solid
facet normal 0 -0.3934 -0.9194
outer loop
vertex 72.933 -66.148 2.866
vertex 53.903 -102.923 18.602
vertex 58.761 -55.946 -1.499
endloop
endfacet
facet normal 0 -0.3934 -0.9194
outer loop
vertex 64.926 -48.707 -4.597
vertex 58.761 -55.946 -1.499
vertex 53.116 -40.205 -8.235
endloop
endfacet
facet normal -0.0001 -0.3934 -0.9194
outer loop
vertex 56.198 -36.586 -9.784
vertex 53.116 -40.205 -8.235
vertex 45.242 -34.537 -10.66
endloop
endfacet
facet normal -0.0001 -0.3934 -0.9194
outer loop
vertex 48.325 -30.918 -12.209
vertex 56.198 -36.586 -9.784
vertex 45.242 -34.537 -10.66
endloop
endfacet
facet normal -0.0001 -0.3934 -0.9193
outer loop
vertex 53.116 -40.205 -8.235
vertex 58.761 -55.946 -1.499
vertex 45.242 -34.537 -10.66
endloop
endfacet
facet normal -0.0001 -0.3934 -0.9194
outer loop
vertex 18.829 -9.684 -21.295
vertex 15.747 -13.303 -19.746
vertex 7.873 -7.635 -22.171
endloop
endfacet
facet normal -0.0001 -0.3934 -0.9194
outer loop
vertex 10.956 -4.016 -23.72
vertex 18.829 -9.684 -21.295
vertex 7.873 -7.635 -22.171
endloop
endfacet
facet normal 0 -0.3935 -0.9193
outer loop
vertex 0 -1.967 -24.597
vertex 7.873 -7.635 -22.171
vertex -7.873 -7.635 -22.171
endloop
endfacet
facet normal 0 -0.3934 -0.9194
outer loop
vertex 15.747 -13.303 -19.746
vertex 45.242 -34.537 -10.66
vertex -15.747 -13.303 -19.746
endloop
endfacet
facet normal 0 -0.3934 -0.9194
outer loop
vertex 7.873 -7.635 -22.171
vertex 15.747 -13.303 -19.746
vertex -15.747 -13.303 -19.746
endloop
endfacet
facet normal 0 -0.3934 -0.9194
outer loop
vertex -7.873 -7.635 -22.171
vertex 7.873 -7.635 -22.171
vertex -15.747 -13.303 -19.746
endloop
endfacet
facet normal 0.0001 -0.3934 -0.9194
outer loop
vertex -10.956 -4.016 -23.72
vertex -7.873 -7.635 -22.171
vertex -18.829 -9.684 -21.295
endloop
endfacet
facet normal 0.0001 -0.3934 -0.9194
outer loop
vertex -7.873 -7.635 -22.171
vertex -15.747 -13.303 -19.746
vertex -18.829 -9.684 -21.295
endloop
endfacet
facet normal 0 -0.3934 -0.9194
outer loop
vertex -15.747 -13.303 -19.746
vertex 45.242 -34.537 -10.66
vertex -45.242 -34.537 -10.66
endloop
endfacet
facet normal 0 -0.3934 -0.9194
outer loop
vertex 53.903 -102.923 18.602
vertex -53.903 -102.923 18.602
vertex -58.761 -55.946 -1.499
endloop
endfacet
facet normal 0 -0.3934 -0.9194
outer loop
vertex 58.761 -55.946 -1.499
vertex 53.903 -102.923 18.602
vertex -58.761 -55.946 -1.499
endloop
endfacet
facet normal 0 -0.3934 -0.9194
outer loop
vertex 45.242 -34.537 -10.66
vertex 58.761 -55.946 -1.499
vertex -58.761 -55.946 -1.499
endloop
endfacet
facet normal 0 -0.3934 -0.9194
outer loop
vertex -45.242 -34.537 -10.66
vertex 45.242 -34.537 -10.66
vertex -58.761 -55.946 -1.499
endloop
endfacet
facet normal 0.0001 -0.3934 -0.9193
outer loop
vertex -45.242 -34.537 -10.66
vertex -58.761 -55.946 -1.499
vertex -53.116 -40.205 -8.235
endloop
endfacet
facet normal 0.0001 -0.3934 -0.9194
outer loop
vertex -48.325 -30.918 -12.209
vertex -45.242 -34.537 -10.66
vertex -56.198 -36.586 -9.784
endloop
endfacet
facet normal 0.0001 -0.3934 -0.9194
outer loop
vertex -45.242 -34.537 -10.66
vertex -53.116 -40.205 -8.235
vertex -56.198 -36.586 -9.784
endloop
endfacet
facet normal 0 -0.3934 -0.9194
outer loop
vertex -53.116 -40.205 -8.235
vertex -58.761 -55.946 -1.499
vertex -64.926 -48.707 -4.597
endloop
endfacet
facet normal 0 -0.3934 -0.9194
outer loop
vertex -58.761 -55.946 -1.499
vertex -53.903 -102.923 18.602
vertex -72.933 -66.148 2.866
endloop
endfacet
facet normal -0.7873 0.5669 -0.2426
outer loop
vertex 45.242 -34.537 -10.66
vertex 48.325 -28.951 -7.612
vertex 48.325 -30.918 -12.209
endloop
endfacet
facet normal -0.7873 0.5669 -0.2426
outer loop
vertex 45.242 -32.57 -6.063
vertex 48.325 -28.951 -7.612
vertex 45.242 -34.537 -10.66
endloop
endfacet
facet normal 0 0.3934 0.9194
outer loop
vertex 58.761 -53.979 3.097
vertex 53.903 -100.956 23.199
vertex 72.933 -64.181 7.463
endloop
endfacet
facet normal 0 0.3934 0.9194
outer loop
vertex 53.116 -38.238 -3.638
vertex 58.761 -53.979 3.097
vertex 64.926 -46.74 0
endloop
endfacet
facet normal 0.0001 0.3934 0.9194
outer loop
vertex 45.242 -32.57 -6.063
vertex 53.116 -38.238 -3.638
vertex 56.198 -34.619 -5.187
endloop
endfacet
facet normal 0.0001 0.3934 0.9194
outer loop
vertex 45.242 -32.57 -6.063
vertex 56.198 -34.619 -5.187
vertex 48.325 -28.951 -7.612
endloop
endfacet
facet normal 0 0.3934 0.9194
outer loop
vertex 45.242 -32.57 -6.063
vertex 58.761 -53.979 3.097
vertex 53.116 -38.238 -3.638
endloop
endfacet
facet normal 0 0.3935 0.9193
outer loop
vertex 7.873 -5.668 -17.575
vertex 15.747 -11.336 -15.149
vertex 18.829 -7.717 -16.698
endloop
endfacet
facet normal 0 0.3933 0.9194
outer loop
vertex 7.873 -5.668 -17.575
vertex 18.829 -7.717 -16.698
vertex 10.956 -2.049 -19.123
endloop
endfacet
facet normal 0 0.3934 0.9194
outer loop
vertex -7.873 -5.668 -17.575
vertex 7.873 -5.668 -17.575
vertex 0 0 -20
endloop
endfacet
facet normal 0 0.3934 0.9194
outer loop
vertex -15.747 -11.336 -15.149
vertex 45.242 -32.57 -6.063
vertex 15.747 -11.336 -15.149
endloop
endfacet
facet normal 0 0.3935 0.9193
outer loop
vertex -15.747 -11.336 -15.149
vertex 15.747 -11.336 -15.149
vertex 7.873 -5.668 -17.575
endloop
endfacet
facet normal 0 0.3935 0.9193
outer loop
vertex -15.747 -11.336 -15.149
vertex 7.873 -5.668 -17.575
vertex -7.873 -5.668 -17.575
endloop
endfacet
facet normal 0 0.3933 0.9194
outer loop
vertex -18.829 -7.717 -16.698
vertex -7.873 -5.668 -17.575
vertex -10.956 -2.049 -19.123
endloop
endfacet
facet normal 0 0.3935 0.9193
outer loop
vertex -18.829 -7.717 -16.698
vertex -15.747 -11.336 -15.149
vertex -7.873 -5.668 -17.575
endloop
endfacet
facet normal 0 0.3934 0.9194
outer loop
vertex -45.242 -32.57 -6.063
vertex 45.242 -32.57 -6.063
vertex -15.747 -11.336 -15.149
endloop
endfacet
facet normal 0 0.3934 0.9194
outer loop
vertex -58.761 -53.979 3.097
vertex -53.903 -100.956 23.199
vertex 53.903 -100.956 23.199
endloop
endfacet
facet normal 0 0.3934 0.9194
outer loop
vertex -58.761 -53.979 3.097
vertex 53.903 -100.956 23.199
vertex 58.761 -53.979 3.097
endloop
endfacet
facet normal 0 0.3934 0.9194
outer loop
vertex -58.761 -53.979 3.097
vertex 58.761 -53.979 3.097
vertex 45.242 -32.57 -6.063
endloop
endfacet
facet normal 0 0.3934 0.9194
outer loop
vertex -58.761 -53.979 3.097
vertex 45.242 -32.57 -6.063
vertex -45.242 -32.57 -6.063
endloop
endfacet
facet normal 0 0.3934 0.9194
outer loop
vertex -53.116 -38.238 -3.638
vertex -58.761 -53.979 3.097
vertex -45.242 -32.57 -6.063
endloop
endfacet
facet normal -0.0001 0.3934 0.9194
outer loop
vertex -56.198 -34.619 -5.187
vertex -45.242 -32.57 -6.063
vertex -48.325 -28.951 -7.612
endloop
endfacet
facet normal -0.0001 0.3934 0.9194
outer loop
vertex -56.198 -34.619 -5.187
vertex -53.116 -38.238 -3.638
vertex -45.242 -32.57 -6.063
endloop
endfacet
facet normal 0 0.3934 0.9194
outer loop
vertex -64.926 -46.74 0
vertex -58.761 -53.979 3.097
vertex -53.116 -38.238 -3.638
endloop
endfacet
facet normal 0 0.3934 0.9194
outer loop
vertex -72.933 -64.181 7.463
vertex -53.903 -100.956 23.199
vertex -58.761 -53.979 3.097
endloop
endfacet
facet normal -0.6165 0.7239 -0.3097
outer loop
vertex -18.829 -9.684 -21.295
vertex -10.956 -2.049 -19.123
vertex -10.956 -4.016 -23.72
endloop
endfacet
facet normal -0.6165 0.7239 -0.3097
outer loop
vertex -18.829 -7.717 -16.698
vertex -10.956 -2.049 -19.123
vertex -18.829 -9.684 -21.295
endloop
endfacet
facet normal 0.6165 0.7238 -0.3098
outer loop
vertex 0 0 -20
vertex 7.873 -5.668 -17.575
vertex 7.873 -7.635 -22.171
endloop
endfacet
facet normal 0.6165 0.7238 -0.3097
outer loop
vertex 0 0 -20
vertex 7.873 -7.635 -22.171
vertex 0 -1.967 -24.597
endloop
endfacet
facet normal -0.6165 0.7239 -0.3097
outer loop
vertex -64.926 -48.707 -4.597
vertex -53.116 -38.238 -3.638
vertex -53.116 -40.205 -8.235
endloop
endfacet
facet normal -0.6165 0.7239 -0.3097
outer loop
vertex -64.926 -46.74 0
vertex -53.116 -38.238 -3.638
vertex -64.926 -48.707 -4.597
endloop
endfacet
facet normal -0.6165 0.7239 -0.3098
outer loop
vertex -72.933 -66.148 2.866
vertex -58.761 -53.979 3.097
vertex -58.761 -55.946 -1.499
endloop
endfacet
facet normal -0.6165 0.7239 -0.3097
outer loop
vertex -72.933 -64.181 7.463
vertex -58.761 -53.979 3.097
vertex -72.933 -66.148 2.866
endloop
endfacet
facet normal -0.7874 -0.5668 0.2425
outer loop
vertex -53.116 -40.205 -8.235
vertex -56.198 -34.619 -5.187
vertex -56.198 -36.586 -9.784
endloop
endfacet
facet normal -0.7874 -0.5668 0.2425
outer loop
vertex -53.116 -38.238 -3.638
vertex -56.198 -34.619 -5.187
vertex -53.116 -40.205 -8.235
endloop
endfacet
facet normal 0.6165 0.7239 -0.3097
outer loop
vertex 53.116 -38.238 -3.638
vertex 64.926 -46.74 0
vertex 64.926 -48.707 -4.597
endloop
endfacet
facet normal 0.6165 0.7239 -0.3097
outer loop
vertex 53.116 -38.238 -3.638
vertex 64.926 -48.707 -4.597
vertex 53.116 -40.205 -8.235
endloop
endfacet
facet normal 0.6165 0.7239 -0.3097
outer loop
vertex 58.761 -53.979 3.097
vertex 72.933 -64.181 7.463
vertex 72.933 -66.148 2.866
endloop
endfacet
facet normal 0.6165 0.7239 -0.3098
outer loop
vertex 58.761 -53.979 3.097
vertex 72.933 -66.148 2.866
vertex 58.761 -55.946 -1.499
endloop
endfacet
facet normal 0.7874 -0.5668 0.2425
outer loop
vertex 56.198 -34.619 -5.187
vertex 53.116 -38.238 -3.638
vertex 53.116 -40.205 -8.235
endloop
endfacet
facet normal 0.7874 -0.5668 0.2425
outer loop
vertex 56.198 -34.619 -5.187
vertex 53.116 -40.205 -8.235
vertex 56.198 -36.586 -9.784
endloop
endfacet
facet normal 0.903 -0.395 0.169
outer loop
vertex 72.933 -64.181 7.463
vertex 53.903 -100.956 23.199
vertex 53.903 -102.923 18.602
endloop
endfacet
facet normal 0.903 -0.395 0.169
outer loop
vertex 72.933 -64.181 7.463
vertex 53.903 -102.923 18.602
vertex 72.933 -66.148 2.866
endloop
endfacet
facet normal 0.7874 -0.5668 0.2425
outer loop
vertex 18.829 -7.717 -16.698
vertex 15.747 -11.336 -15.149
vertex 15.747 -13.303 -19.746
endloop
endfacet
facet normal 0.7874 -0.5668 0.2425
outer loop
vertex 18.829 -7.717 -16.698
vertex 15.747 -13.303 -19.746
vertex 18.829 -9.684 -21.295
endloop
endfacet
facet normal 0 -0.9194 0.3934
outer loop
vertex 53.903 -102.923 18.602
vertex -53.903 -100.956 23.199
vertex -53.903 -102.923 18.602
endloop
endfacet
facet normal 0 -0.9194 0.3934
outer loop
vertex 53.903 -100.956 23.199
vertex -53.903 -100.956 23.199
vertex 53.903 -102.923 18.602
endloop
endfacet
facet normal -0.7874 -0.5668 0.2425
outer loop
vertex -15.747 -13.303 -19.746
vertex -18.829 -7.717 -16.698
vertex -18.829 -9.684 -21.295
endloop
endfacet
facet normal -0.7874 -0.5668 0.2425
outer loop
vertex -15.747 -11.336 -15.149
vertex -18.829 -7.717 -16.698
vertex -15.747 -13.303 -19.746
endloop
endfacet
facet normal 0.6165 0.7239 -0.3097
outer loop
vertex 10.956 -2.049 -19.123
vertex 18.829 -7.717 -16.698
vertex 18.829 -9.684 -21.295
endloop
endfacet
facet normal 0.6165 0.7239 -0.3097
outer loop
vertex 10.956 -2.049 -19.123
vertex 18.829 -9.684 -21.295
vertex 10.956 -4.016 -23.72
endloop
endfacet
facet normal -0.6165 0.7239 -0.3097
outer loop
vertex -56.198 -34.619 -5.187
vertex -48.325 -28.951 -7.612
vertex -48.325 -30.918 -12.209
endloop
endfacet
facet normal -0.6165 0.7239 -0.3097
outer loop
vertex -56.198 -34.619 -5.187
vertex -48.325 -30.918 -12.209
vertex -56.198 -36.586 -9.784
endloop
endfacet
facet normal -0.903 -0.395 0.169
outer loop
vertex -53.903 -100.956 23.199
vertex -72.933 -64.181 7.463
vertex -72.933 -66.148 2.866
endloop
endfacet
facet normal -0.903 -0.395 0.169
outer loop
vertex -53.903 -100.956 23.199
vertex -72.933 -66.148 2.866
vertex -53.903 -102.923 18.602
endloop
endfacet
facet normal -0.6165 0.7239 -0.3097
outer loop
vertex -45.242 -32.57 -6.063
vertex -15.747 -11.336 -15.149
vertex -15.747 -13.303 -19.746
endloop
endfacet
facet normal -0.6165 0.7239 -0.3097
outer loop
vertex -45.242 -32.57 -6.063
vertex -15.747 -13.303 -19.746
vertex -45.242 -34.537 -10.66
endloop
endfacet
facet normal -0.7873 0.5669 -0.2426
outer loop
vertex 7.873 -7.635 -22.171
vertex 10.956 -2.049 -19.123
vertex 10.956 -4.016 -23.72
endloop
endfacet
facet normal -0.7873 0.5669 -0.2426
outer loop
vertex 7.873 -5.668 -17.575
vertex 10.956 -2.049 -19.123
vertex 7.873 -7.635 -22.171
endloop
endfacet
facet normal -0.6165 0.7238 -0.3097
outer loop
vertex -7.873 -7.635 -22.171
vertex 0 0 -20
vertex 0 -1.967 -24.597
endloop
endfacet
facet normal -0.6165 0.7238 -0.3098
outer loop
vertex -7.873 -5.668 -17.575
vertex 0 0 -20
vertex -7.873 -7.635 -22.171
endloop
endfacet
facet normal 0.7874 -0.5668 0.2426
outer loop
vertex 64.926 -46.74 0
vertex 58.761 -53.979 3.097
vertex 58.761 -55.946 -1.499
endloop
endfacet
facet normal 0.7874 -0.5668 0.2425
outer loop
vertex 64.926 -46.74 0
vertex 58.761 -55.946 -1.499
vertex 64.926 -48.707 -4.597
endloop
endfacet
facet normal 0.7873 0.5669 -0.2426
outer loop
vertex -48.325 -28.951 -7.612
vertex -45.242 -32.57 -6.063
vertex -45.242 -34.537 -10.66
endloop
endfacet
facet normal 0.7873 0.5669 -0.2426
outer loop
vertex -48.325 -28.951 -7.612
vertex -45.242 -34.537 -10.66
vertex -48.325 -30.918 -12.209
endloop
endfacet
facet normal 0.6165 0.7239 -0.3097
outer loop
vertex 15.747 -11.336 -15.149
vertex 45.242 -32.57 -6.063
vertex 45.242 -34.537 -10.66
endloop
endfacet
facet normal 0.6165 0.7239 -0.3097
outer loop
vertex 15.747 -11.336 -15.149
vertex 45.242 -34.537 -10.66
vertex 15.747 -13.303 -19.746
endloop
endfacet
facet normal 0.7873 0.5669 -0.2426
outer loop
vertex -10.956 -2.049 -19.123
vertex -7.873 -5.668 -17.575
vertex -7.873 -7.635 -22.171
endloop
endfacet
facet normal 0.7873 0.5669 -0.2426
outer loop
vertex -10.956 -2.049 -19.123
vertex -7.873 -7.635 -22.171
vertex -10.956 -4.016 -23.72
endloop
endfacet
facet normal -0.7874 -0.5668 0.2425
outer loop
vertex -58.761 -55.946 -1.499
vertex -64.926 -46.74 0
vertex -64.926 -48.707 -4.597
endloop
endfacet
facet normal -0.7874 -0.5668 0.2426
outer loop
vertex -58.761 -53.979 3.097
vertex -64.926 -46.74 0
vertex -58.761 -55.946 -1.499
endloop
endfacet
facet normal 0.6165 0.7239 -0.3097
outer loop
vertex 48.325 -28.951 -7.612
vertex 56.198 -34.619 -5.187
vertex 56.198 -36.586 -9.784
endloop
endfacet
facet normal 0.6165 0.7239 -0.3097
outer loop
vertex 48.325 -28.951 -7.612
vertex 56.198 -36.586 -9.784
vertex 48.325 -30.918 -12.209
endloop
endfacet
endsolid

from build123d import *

# Parameters (mm, degrees)
BOSS_EXTRU_2_DEPTH = 5


with BuildPart() as part:
    # Esquisse3D1 → Boss.-Extru.2 (new body)
    with BuildSketch(Plane(origin=(0, 0, -20), x_dir=(0.440651848036545, -0.8252970730775361, 0.35314400744119906), z_dir=(0, -0.39339715689728005, -0.9193686295198118))):
        Polygon((0, 0), (2.064889772, 9.784489268), (-2.827354862, 10.816934154), (-0.76246509, 20.601423421), (4.129779544, 19.568978535), (11.865292841, 56.223742318), (6.973048207, 57.256187204), (9.037937979, 67.040676471), (13.930182613, 66.008231585), (17.027517271, 80.684965487), (26.812006539, 78.620075715), (30.528808128, 96.232156396), (74.821304729, 96.775888054), (122.326612599, 0), (94.804862198, -34.708416185), (78.59808061, -26.876415767), (74.246969266, -35.880183316), (60.741317943, -29.353516301), (58.565762271, -33.855400075), (49.561994722, -29.504288732), (51.737550394, -25.002404957), (18.007535098, -8.702222687), (15.831979426, -13.204106461), (6.828211877, -8.852995118), (9.003767549, -4.351111343), align=None)
    extrude(amount=BOSS_EXTRU_2_DEPTH)


solid = part.part
